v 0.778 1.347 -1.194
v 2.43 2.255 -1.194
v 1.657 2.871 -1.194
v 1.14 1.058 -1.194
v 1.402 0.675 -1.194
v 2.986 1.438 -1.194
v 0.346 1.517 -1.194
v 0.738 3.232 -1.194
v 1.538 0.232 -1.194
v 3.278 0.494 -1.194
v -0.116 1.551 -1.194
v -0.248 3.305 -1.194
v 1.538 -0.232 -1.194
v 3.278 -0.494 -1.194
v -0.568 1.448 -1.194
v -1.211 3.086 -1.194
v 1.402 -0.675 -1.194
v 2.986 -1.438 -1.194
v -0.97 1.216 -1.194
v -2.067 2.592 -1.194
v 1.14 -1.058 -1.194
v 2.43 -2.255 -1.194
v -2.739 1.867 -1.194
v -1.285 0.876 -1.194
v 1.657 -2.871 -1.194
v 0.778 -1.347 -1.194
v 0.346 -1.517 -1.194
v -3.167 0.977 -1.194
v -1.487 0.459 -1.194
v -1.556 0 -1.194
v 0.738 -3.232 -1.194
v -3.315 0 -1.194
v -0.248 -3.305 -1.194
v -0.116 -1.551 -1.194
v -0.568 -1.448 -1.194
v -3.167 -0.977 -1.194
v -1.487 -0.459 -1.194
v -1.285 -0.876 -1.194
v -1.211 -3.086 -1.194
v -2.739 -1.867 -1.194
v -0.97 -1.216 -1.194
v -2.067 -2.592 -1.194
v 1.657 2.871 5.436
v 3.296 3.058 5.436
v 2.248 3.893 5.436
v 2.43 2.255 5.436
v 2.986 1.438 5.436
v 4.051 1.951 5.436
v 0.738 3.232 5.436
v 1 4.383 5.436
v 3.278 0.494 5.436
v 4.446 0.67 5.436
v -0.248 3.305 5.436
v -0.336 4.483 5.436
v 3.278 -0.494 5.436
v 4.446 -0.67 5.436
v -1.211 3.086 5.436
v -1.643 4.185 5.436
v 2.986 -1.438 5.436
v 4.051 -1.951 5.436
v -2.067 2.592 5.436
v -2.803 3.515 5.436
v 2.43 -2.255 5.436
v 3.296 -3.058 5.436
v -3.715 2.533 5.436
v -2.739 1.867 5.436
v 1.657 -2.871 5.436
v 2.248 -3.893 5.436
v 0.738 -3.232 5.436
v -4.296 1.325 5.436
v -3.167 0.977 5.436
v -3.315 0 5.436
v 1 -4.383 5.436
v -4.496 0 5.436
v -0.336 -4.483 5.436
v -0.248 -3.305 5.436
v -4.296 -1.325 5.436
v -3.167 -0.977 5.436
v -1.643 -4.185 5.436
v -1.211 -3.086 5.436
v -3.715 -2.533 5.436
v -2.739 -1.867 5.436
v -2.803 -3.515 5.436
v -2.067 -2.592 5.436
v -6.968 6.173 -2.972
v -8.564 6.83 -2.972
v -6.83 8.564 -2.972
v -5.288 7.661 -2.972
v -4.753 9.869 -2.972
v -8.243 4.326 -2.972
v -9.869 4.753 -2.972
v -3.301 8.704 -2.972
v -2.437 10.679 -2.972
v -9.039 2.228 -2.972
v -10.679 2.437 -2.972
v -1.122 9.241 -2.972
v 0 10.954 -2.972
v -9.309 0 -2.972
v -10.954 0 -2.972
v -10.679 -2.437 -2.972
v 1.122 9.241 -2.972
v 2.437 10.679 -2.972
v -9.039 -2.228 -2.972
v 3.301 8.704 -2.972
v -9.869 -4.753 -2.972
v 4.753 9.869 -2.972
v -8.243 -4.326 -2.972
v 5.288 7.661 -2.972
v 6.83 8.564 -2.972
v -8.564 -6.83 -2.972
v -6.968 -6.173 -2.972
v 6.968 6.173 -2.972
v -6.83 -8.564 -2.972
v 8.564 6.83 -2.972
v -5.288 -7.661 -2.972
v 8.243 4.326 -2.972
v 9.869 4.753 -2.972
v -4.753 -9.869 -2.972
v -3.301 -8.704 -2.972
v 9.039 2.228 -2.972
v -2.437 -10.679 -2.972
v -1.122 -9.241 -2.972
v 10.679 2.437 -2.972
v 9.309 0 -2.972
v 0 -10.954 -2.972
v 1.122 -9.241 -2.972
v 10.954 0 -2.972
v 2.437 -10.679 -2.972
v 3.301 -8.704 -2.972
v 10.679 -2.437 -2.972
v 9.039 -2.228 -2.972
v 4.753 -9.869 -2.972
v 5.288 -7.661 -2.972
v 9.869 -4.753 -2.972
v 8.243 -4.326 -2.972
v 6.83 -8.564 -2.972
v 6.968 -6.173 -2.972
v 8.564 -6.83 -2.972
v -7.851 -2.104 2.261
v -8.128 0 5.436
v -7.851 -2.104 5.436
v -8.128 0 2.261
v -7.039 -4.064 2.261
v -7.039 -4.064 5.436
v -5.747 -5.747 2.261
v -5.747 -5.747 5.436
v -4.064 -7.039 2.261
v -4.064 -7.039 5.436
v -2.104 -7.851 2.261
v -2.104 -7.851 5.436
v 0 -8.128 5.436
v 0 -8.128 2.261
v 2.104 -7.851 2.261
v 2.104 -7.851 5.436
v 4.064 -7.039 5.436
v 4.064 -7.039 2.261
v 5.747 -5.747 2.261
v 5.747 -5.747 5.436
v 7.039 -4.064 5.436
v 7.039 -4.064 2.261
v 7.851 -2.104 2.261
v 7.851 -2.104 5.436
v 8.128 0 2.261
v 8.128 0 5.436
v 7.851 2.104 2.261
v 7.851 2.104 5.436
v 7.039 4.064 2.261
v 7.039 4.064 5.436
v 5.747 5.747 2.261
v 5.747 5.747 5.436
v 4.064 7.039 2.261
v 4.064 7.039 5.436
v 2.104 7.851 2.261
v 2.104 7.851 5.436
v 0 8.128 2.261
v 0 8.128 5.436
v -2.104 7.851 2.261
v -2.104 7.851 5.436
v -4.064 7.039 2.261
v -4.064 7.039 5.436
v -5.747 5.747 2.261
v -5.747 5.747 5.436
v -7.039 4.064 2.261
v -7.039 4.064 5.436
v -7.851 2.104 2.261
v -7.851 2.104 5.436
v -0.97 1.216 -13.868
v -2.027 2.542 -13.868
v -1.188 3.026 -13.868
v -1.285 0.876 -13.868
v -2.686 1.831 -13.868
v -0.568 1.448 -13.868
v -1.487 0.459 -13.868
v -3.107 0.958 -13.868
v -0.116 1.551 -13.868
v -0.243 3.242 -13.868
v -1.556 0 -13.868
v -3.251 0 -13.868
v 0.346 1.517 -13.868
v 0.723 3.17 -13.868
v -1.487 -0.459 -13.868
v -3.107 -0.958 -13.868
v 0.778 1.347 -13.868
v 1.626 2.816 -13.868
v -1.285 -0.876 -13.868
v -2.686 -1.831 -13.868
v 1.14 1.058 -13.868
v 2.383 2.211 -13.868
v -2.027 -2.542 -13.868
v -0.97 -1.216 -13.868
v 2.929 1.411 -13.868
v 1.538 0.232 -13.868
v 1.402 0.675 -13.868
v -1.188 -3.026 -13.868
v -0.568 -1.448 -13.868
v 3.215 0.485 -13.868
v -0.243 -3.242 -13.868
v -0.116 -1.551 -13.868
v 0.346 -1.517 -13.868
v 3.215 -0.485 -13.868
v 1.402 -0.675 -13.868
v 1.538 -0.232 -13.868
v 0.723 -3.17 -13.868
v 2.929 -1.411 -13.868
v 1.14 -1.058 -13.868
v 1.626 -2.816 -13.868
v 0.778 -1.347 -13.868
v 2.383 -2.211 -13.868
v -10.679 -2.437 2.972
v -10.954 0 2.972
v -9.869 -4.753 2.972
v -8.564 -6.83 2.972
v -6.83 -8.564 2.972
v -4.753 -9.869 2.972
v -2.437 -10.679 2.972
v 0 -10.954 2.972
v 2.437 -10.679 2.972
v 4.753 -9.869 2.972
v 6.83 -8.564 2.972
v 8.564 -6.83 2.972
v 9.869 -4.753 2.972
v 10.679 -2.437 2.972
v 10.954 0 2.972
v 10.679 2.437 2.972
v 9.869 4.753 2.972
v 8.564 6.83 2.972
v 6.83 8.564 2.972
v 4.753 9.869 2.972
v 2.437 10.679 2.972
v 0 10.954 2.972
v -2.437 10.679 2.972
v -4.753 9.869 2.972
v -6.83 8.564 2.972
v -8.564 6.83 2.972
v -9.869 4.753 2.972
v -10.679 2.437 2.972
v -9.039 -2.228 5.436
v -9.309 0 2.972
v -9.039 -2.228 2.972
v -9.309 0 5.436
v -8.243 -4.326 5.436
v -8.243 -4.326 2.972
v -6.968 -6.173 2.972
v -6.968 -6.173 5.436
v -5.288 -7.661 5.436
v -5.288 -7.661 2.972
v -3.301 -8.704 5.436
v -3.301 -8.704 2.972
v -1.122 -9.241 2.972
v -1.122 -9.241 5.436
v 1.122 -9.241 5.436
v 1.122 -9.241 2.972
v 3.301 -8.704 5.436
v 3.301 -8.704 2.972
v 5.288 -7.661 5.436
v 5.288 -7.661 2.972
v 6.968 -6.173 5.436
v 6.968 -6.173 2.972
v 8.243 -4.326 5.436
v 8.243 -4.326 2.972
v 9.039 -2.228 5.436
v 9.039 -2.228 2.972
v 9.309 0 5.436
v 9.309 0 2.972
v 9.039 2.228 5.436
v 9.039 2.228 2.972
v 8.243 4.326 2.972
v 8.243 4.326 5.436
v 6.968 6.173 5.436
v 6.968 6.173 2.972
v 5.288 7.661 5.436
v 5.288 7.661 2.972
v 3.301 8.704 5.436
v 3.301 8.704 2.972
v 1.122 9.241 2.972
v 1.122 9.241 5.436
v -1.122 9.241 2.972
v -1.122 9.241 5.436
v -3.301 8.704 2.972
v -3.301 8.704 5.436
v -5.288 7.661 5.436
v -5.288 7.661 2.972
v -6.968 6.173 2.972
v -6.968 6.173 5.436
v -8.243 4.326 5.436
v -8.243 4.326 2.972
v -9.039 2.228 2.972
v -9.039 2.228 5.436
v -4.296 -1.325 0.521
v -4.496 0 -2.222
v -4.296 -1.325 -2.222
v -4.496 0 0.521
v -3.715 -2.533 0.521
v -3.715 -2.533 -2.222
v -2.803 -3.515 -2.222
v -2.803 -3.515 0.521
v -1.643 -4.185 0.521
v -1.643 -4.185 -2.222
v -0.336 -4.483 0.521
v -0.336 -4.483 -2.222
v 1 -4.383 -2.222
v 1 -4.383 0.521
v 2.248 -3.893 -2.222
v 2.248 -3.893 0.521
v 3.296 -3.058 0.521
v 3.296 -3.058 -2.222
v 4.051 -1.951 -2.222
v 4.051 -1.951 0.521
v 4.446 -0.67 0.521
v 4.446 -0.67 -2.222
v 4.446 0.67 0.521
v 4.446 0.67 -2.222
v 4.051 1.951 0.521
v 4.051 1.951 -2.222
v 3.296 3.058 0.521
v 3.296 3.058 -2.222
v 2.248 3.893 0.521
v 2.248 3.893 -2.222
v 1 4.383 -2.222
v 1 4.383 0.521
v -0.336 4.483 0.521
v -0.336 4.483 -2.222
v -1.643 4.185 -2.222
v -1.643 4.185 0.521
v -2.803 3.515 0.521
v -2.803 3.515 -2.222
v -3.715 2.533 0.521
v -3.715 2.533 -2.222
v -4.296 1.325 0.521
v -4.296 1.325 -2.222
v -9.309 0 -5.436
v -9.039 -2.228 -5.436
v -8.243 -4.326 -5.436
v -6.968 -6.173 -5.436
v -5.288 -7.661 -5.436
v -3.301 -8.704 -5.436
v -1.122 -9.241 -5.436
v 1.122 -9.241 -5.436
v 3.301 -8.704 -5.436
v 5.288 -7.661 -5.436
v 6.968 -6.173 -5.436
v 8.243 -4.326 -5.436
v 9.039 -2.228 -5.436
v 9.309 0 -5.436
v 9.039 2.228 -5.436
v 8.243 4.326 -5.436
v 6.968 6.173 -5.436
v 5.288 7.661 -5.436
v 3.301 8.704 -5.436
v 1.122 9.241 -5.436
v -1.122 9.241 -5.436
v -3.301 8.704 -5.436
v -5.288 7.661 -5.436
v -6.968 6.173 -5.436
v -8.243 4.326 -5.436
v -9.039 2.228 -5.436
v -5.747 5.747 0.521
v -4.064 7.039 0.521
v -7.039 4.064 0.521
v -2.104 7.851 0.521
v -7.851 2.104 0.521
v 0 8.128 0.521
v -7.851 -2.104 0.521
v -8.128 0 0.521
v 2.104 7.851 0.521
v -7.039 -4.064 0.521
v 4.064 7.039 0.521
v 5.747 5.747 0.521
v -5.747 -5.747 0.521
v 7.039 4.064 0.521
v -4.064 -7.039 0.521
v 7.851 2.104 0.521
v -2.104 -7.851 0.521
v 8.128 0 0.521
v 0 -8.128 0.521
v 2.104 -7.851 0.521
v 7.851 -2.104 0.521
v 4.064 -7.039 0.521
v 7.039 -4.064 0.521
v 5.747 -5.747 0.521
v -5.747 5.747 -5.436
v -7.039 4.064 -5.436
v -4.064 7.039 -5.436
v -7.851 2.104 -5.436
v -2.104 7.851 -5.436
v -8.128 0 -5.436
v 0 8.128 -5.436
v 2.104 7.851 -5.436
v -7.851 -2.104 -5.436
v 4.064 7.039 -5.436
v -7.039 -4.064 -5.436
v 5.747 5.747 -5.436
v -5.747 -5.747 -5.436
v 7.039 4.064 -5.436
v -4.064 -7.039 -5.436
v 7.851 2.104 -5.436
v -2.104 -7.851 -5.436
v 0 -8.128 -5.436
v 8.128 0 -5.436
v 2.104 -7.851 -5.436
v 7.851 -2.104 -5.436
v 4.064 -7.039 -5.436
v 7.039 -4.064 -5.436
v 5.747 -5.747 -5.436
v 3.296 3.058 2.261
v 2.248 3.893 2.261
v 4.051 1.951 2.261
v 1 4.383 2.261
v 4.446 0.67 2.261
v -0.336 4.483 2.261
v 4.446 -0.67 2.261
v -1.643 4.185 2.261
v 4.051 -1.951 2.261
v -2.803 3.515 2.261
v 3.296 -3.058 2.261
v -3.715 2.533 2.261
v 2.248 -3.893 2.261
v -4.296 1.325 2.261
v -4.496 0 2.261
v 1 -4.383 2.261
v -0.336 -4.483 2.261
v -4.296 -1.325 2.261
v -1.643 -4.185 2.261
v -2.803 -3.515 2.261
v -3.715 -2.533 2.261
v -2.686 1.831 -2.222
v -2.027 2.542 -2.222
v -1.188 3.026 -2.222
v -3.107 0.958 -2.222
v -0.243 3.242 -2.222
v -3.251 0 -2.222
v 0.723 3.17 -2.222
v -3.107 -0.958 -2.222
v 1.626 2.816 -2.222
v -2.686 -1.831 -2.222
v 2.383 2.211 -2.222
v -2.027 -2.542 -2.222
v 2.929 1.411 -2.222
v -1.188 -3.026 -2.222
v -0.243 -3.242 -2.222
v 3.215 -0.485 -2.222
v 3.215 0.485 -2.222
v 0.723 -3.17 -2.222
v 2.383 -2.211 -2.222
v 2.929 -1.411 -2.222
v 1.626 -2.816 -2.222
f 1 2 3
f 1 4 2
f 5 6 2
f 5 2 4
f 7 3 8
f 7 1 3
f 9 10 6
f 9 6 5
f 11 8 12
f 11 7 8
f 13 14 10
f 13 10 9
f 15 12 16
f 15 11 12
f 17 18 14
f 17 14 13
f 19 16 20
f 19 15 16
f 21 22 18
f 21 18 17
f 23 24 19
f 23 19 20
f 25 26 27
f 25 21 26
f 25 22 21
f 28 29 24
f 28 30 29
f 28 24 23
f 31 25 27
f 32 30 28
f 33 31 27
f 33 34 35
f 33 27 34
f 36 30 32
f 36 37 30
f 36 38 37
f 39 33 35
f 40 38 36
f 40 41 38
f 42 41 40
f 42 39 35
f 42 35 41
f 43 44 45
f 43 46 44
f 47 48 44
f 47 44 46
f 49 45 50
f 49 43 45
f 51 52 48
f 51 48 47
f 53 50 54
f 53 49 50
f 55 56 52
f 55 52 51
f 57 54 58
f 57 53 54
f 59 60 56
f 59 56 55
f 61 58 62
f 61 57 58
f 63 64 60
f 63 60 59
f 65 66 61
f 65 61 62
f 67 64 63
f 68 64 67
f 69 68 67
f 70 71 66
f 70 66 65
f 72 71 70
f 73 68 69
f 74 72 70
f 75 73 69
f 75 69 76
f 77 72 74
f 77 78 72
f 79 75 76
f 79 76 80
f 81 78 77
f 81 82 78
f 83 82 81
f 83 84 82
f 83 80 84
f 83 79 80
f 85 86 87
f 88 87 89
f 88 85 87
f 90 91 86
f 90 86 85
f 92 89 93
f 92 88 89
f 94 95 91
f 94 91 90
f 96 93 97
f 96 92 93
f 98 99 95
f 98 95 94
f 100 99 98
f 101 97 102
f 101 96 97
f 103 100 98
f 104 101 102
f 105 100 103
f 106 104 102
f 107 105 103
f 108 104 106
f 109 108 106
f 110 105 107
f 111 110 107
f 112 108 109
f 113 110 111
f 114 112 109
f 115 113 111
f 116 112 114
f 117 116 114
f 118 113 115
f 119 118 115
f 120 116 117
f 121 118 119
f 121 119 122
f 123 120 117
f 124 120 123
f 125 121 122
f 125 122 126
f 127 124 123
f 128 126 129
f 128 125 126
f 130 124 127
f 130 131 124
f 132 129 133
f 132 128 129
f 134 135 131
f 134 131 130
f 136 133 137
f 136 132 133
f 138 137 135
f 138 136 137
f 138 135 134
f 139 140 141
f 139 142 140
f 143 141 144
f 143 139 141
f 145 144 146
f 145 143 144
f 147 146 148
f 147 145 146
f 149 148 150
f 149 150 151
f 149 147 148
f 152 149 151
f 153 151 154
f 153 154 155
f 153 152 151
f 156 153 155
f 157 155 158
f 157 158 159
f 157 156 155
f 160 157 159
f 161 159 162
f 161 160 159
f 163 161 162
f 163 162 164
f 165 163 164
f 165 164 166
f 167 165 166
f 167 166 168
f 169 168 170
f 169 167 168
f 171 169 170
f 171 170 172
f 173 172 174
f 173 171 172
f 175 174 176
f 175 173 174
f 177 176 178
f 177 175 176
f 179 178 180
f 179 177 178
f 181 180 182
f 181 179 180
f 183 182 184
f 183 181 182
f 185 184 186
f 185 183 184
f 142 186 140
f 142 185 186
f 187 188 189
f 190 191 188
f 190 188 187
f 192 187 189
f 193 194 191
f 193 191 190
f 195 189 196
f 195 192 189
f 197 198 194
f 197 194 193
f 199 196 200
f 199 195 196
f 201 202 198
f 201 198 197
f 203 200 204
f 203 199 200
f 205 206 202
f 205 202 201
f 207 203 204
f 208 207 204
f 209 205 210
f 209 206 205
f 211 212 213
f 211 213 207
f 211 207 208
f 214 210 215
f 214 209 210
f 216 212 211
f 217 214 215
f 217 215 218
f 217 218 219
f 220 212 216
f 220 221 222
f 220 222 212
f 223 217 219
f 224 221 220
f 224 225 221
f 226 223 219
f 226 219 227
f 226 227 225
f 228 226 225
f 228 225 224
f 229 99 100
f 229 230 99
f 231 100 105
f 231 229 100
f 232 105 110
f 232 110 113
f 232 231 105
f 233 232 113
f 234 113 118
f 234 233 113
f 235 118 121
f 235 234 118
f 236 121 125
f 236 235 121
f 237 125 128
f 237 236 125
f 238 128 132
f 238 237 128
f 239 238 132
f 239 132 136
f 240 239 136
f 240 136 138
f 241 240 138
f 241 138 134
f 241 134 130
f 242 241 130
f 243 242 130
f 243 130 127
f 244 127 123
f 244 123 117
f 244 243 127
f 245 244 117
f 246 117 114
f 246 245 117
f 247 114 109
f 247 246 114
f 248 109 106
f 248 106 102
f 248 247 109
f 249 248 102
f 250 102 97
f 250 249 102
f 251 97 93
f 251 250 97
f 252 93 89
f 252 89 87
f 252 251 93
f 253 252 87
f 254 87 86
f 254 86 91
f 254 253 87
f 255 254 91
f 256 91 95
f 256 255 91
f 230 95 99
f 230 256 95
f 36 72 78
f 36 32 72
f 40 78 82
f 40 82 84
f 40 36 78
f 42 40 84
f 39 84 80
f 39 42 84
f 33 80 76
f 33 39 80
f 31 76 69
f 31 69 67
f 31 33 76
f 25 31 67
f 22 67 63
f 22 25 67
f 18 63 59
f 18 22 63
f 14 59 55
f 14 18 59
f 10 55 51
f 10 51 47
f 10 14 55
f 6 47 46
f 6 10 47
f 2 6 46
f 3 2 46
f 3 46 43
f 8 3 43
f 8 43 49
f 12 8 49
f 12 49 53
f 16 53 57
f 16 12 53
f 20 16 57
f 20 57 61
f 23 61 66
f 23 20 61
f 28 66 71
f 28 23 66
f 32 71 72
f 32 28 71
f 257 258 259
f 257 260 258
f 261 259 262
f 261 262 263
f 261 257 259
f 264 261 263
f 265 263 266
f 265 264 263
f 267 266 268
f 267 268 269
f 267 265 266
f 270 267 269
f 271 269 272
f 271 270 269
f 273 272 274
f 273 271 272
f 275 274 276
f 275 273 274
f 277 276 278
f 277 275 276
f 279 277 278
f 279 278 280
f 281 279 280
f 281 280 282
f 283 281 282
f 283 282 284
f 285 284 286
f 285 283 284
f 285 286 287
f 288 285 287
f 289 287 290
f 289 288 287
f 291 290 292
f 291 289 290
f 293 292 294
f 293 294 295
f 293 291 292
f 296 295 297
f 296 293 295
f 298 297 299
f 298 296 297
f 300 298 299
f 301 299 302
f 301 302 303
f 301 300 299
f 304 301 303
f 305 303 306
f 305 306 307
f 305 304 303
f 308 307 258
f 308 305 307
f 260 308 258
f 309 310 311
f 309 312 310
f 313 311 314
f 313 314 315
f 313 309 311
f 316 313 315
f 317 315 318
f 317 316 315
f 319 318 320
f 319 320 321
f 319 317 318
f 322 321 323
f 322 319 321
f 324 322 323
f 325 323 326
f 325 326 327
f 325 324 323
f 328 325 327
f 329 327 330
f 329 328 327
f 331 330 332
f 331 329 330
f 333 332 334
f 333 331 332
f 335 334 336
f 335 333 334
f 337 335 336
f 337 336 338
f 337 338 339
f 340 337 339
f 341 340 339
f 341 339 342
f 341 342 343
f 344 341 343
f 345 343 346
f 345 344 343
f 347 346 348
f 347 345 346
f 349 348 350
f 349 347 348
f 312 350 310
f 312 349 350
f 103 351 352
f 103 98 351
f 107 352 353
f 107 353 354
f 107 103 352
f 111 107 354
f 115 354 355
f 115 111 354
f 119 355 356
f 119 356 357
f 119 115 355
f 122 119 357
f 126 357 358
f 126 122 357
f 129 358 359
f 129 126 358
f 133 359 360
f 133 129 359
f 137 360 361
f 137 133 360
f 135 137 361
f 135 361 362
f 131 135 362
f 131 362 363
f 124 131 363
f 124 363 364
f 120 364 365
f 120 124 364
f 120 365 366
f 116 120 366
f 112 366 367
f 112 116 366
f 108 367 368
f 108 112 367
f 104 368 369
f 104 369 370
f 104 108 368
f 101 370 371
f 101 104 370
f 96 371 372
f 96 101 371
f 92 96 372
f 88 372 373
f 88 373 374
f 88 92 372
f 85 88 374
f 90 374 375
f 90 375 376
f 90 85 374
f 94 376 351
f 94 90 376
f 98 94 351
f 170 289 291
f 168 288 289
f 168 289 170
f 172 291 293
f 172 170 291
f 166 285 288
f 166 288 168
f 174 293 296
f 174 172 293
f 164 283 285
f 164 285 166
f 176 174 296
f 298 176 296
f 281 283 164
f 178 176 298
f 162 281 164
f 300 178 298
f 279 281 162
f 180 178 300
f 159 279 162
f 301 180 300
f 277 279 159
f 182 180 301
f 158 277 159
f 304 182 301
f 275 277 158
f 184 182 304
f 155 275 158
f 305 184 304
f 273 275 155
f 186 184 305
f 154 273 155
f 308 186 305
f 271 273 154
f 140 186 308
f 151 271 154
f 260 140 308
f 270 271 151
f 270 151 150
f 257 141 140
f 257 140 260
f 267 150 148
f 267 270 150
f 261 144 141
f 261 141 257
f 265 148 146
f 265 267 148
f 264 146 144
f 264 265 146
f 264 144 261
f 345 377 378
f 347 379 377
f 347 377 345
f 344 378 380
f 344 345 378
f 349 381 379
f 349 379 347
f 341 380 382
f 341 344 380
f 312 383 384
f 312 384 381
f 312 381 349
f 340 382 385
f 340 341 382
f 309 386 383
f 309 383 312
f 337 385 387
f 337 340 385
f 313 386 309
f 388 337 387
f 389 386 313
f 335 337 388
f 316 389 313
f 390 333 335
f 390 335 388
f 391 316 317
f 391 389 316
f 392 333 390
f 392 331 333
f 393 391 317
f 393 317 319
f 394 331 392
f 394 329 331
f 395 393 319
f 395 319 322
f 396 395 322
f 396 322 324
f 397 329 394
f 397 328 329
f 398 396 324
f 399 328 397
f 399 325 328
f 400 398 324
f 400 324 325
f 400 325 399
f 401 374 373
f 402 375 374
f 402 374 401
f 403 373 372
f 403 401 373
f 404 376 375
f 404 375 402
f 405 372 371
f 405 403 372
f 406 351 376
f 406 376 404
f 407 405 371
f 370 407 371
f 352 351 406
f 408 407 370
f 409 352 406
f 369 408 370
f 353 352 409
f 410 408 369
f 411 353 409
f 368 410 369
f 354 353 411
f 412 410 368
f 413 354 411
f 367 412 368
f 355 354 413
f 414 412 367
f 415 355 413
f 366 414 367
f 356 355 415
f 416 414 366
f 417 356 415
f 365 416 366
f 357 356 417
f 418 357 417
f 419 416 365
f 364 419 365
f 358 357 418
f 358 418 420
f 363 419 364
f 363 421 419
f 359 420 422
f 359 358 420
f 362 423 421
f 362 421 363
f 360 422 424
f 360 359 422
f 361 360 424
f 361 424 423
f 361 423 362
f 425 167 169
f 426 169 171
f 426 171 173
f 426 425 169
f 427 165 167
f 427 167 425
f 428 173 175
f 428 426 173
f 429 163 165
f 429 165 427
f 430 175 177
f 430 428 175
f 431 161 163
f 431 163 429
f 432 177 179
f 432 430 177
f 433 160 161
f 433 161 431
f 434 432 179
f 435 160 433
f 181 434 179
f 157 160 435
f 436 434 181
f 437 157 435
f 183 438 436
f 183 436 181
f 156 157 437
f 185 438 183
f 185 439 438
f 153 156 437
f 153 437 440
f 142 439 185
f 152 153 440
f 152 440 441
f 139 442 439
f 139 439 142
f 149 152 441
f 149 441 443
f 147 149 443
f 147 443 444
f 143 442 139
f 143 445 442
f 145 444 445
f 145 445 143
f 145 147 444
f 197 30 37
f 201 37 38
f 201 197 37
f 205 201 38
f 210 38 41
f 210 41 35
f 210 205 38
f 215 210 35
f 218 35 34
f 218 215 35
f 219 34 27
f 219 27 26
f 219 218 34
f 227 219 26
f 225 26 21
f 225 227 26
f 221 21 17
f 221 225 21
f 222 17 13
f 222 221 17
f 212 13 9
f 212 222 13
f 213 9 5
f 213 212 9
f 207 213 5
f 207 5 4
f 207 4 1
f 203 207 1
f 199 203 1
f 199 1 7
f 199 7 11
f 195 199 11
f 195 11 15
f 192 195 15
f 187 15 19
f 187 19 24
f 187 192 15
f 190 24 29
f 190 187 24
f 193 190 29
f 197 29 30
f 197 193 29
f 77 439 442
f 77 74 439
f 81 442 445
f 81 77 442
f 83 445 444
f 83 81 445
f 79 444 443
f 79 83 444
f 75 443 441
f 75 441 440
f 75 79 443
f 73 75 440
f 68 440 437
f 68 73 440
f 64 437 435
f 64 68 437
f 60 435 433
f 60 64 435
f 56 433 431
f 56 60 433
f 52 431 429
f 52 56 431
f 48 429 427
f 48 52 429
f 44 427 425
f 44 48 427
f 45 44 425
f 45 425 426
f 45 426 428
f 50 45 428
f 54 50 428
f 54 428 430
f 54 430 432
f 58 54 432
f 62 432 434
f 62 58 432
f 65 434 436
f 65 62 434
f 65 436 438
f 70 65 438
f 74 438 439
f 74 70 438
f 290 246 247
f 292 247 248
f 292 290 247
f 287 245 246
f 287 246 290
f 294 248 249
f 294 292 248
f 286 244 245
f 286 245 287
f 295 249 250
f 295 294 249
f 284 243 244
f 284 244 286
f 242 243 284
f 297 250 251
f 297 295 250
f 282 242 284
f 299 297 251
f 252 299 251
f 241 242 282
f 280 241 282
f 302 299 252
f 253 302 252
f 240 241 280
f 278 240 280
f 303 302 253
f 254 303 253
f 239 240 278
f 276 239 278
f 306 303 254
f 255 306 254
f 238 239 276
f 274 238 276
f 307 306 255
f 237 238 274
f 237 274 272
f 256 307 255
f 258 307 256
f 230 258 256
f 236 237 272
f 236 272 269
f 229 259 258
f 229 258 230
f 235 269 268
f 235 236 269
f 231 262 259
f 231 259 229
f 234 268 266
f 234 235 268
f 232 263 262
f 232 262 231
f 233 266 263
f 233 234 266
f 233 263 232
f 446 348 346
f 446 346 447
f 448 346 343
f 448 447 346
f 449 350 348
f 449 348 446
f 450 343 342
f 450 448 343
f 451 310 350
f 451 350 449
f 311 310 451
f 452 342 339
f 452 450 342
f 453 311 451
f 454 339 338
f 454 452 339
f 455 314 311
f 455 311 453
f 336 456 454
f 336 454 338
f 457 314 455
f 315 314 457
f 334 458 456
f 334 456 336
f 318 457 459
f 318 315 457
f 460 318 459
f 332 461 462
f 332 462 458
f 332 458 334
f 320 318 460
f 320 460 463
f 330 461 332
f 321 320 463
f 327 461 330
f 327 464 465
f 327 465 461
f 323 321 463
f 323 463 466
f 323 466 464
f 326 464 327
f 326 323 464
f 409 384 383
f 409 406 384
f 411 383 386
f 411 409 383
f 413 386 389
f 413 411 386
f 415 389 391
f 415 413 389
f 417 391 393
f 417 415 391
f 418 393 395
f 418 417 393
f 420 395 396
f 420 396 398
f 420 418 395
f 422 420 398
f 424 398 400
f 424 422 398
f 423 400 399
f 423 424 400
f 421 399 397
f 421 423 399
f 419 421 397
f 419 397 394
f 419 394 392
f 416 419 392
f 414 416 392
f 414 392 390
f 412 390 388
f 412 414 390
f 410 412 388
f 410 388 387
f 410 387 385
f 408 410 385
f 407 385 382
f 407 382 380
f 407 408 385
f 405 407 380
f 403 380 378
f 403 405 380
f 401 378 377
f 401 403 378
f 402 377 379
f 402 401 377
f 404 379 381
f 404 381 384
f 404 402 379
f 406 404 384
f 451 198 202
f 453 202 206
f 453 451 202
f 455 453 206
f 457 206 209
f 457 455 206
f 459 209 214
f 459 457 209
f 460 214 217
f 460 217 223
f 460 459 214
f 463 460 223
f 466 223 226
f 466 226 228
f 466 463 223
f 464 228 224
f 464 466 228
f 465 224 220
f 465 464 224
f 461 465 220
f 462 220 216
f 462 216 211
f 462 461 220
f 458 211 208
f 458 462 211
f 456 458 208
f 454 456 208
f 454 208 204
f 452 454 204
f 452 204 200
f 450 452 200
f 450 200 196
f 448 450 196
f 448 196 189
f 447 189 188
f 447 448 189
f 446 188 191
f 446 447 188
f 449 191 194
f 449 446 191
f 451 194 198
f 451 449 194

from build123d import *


with BuildPart() as part:
    # Sketch1 → Revolve1 (revolve)
    with BuildSketch(Plane(origin=(0, 0, 0), x_dir=(0, 0, -1), z_dir=(1, 0, 0)), mode=Mode.PRIVATE) as revolve1_sk:
        Polygon((2.9718, 10.95375), (-2.9718, 10.95375), (-2.9718, 9.3091), (-5.4356, 9.3091), (-5.4356, 8.128), (-2.2606, 8.128), (-2.2606, 4.4958), (-5.4356, 4.4958), (-5.4356, 3.3147), (1.1938, 3.3147), (1.1938, 1.55575), (13.8684, 1.55575), (13.8684, 3.2512), (2.2225, 3.2512), (2.2225, 4.4958), (-0.5207, 4.4958), (-0.5207, 8.128), (5.4356, 8.128), (5.4356, 9.3091), (2.9718, 9.3091), align=None)
    revolve(revolve1_sk.sketch.rotate(Axis((0, 0, 0), (0, 0, 1)), 90), axis=Axis((0, 0, 0), (0, 0, 1)))


solid = part.part
